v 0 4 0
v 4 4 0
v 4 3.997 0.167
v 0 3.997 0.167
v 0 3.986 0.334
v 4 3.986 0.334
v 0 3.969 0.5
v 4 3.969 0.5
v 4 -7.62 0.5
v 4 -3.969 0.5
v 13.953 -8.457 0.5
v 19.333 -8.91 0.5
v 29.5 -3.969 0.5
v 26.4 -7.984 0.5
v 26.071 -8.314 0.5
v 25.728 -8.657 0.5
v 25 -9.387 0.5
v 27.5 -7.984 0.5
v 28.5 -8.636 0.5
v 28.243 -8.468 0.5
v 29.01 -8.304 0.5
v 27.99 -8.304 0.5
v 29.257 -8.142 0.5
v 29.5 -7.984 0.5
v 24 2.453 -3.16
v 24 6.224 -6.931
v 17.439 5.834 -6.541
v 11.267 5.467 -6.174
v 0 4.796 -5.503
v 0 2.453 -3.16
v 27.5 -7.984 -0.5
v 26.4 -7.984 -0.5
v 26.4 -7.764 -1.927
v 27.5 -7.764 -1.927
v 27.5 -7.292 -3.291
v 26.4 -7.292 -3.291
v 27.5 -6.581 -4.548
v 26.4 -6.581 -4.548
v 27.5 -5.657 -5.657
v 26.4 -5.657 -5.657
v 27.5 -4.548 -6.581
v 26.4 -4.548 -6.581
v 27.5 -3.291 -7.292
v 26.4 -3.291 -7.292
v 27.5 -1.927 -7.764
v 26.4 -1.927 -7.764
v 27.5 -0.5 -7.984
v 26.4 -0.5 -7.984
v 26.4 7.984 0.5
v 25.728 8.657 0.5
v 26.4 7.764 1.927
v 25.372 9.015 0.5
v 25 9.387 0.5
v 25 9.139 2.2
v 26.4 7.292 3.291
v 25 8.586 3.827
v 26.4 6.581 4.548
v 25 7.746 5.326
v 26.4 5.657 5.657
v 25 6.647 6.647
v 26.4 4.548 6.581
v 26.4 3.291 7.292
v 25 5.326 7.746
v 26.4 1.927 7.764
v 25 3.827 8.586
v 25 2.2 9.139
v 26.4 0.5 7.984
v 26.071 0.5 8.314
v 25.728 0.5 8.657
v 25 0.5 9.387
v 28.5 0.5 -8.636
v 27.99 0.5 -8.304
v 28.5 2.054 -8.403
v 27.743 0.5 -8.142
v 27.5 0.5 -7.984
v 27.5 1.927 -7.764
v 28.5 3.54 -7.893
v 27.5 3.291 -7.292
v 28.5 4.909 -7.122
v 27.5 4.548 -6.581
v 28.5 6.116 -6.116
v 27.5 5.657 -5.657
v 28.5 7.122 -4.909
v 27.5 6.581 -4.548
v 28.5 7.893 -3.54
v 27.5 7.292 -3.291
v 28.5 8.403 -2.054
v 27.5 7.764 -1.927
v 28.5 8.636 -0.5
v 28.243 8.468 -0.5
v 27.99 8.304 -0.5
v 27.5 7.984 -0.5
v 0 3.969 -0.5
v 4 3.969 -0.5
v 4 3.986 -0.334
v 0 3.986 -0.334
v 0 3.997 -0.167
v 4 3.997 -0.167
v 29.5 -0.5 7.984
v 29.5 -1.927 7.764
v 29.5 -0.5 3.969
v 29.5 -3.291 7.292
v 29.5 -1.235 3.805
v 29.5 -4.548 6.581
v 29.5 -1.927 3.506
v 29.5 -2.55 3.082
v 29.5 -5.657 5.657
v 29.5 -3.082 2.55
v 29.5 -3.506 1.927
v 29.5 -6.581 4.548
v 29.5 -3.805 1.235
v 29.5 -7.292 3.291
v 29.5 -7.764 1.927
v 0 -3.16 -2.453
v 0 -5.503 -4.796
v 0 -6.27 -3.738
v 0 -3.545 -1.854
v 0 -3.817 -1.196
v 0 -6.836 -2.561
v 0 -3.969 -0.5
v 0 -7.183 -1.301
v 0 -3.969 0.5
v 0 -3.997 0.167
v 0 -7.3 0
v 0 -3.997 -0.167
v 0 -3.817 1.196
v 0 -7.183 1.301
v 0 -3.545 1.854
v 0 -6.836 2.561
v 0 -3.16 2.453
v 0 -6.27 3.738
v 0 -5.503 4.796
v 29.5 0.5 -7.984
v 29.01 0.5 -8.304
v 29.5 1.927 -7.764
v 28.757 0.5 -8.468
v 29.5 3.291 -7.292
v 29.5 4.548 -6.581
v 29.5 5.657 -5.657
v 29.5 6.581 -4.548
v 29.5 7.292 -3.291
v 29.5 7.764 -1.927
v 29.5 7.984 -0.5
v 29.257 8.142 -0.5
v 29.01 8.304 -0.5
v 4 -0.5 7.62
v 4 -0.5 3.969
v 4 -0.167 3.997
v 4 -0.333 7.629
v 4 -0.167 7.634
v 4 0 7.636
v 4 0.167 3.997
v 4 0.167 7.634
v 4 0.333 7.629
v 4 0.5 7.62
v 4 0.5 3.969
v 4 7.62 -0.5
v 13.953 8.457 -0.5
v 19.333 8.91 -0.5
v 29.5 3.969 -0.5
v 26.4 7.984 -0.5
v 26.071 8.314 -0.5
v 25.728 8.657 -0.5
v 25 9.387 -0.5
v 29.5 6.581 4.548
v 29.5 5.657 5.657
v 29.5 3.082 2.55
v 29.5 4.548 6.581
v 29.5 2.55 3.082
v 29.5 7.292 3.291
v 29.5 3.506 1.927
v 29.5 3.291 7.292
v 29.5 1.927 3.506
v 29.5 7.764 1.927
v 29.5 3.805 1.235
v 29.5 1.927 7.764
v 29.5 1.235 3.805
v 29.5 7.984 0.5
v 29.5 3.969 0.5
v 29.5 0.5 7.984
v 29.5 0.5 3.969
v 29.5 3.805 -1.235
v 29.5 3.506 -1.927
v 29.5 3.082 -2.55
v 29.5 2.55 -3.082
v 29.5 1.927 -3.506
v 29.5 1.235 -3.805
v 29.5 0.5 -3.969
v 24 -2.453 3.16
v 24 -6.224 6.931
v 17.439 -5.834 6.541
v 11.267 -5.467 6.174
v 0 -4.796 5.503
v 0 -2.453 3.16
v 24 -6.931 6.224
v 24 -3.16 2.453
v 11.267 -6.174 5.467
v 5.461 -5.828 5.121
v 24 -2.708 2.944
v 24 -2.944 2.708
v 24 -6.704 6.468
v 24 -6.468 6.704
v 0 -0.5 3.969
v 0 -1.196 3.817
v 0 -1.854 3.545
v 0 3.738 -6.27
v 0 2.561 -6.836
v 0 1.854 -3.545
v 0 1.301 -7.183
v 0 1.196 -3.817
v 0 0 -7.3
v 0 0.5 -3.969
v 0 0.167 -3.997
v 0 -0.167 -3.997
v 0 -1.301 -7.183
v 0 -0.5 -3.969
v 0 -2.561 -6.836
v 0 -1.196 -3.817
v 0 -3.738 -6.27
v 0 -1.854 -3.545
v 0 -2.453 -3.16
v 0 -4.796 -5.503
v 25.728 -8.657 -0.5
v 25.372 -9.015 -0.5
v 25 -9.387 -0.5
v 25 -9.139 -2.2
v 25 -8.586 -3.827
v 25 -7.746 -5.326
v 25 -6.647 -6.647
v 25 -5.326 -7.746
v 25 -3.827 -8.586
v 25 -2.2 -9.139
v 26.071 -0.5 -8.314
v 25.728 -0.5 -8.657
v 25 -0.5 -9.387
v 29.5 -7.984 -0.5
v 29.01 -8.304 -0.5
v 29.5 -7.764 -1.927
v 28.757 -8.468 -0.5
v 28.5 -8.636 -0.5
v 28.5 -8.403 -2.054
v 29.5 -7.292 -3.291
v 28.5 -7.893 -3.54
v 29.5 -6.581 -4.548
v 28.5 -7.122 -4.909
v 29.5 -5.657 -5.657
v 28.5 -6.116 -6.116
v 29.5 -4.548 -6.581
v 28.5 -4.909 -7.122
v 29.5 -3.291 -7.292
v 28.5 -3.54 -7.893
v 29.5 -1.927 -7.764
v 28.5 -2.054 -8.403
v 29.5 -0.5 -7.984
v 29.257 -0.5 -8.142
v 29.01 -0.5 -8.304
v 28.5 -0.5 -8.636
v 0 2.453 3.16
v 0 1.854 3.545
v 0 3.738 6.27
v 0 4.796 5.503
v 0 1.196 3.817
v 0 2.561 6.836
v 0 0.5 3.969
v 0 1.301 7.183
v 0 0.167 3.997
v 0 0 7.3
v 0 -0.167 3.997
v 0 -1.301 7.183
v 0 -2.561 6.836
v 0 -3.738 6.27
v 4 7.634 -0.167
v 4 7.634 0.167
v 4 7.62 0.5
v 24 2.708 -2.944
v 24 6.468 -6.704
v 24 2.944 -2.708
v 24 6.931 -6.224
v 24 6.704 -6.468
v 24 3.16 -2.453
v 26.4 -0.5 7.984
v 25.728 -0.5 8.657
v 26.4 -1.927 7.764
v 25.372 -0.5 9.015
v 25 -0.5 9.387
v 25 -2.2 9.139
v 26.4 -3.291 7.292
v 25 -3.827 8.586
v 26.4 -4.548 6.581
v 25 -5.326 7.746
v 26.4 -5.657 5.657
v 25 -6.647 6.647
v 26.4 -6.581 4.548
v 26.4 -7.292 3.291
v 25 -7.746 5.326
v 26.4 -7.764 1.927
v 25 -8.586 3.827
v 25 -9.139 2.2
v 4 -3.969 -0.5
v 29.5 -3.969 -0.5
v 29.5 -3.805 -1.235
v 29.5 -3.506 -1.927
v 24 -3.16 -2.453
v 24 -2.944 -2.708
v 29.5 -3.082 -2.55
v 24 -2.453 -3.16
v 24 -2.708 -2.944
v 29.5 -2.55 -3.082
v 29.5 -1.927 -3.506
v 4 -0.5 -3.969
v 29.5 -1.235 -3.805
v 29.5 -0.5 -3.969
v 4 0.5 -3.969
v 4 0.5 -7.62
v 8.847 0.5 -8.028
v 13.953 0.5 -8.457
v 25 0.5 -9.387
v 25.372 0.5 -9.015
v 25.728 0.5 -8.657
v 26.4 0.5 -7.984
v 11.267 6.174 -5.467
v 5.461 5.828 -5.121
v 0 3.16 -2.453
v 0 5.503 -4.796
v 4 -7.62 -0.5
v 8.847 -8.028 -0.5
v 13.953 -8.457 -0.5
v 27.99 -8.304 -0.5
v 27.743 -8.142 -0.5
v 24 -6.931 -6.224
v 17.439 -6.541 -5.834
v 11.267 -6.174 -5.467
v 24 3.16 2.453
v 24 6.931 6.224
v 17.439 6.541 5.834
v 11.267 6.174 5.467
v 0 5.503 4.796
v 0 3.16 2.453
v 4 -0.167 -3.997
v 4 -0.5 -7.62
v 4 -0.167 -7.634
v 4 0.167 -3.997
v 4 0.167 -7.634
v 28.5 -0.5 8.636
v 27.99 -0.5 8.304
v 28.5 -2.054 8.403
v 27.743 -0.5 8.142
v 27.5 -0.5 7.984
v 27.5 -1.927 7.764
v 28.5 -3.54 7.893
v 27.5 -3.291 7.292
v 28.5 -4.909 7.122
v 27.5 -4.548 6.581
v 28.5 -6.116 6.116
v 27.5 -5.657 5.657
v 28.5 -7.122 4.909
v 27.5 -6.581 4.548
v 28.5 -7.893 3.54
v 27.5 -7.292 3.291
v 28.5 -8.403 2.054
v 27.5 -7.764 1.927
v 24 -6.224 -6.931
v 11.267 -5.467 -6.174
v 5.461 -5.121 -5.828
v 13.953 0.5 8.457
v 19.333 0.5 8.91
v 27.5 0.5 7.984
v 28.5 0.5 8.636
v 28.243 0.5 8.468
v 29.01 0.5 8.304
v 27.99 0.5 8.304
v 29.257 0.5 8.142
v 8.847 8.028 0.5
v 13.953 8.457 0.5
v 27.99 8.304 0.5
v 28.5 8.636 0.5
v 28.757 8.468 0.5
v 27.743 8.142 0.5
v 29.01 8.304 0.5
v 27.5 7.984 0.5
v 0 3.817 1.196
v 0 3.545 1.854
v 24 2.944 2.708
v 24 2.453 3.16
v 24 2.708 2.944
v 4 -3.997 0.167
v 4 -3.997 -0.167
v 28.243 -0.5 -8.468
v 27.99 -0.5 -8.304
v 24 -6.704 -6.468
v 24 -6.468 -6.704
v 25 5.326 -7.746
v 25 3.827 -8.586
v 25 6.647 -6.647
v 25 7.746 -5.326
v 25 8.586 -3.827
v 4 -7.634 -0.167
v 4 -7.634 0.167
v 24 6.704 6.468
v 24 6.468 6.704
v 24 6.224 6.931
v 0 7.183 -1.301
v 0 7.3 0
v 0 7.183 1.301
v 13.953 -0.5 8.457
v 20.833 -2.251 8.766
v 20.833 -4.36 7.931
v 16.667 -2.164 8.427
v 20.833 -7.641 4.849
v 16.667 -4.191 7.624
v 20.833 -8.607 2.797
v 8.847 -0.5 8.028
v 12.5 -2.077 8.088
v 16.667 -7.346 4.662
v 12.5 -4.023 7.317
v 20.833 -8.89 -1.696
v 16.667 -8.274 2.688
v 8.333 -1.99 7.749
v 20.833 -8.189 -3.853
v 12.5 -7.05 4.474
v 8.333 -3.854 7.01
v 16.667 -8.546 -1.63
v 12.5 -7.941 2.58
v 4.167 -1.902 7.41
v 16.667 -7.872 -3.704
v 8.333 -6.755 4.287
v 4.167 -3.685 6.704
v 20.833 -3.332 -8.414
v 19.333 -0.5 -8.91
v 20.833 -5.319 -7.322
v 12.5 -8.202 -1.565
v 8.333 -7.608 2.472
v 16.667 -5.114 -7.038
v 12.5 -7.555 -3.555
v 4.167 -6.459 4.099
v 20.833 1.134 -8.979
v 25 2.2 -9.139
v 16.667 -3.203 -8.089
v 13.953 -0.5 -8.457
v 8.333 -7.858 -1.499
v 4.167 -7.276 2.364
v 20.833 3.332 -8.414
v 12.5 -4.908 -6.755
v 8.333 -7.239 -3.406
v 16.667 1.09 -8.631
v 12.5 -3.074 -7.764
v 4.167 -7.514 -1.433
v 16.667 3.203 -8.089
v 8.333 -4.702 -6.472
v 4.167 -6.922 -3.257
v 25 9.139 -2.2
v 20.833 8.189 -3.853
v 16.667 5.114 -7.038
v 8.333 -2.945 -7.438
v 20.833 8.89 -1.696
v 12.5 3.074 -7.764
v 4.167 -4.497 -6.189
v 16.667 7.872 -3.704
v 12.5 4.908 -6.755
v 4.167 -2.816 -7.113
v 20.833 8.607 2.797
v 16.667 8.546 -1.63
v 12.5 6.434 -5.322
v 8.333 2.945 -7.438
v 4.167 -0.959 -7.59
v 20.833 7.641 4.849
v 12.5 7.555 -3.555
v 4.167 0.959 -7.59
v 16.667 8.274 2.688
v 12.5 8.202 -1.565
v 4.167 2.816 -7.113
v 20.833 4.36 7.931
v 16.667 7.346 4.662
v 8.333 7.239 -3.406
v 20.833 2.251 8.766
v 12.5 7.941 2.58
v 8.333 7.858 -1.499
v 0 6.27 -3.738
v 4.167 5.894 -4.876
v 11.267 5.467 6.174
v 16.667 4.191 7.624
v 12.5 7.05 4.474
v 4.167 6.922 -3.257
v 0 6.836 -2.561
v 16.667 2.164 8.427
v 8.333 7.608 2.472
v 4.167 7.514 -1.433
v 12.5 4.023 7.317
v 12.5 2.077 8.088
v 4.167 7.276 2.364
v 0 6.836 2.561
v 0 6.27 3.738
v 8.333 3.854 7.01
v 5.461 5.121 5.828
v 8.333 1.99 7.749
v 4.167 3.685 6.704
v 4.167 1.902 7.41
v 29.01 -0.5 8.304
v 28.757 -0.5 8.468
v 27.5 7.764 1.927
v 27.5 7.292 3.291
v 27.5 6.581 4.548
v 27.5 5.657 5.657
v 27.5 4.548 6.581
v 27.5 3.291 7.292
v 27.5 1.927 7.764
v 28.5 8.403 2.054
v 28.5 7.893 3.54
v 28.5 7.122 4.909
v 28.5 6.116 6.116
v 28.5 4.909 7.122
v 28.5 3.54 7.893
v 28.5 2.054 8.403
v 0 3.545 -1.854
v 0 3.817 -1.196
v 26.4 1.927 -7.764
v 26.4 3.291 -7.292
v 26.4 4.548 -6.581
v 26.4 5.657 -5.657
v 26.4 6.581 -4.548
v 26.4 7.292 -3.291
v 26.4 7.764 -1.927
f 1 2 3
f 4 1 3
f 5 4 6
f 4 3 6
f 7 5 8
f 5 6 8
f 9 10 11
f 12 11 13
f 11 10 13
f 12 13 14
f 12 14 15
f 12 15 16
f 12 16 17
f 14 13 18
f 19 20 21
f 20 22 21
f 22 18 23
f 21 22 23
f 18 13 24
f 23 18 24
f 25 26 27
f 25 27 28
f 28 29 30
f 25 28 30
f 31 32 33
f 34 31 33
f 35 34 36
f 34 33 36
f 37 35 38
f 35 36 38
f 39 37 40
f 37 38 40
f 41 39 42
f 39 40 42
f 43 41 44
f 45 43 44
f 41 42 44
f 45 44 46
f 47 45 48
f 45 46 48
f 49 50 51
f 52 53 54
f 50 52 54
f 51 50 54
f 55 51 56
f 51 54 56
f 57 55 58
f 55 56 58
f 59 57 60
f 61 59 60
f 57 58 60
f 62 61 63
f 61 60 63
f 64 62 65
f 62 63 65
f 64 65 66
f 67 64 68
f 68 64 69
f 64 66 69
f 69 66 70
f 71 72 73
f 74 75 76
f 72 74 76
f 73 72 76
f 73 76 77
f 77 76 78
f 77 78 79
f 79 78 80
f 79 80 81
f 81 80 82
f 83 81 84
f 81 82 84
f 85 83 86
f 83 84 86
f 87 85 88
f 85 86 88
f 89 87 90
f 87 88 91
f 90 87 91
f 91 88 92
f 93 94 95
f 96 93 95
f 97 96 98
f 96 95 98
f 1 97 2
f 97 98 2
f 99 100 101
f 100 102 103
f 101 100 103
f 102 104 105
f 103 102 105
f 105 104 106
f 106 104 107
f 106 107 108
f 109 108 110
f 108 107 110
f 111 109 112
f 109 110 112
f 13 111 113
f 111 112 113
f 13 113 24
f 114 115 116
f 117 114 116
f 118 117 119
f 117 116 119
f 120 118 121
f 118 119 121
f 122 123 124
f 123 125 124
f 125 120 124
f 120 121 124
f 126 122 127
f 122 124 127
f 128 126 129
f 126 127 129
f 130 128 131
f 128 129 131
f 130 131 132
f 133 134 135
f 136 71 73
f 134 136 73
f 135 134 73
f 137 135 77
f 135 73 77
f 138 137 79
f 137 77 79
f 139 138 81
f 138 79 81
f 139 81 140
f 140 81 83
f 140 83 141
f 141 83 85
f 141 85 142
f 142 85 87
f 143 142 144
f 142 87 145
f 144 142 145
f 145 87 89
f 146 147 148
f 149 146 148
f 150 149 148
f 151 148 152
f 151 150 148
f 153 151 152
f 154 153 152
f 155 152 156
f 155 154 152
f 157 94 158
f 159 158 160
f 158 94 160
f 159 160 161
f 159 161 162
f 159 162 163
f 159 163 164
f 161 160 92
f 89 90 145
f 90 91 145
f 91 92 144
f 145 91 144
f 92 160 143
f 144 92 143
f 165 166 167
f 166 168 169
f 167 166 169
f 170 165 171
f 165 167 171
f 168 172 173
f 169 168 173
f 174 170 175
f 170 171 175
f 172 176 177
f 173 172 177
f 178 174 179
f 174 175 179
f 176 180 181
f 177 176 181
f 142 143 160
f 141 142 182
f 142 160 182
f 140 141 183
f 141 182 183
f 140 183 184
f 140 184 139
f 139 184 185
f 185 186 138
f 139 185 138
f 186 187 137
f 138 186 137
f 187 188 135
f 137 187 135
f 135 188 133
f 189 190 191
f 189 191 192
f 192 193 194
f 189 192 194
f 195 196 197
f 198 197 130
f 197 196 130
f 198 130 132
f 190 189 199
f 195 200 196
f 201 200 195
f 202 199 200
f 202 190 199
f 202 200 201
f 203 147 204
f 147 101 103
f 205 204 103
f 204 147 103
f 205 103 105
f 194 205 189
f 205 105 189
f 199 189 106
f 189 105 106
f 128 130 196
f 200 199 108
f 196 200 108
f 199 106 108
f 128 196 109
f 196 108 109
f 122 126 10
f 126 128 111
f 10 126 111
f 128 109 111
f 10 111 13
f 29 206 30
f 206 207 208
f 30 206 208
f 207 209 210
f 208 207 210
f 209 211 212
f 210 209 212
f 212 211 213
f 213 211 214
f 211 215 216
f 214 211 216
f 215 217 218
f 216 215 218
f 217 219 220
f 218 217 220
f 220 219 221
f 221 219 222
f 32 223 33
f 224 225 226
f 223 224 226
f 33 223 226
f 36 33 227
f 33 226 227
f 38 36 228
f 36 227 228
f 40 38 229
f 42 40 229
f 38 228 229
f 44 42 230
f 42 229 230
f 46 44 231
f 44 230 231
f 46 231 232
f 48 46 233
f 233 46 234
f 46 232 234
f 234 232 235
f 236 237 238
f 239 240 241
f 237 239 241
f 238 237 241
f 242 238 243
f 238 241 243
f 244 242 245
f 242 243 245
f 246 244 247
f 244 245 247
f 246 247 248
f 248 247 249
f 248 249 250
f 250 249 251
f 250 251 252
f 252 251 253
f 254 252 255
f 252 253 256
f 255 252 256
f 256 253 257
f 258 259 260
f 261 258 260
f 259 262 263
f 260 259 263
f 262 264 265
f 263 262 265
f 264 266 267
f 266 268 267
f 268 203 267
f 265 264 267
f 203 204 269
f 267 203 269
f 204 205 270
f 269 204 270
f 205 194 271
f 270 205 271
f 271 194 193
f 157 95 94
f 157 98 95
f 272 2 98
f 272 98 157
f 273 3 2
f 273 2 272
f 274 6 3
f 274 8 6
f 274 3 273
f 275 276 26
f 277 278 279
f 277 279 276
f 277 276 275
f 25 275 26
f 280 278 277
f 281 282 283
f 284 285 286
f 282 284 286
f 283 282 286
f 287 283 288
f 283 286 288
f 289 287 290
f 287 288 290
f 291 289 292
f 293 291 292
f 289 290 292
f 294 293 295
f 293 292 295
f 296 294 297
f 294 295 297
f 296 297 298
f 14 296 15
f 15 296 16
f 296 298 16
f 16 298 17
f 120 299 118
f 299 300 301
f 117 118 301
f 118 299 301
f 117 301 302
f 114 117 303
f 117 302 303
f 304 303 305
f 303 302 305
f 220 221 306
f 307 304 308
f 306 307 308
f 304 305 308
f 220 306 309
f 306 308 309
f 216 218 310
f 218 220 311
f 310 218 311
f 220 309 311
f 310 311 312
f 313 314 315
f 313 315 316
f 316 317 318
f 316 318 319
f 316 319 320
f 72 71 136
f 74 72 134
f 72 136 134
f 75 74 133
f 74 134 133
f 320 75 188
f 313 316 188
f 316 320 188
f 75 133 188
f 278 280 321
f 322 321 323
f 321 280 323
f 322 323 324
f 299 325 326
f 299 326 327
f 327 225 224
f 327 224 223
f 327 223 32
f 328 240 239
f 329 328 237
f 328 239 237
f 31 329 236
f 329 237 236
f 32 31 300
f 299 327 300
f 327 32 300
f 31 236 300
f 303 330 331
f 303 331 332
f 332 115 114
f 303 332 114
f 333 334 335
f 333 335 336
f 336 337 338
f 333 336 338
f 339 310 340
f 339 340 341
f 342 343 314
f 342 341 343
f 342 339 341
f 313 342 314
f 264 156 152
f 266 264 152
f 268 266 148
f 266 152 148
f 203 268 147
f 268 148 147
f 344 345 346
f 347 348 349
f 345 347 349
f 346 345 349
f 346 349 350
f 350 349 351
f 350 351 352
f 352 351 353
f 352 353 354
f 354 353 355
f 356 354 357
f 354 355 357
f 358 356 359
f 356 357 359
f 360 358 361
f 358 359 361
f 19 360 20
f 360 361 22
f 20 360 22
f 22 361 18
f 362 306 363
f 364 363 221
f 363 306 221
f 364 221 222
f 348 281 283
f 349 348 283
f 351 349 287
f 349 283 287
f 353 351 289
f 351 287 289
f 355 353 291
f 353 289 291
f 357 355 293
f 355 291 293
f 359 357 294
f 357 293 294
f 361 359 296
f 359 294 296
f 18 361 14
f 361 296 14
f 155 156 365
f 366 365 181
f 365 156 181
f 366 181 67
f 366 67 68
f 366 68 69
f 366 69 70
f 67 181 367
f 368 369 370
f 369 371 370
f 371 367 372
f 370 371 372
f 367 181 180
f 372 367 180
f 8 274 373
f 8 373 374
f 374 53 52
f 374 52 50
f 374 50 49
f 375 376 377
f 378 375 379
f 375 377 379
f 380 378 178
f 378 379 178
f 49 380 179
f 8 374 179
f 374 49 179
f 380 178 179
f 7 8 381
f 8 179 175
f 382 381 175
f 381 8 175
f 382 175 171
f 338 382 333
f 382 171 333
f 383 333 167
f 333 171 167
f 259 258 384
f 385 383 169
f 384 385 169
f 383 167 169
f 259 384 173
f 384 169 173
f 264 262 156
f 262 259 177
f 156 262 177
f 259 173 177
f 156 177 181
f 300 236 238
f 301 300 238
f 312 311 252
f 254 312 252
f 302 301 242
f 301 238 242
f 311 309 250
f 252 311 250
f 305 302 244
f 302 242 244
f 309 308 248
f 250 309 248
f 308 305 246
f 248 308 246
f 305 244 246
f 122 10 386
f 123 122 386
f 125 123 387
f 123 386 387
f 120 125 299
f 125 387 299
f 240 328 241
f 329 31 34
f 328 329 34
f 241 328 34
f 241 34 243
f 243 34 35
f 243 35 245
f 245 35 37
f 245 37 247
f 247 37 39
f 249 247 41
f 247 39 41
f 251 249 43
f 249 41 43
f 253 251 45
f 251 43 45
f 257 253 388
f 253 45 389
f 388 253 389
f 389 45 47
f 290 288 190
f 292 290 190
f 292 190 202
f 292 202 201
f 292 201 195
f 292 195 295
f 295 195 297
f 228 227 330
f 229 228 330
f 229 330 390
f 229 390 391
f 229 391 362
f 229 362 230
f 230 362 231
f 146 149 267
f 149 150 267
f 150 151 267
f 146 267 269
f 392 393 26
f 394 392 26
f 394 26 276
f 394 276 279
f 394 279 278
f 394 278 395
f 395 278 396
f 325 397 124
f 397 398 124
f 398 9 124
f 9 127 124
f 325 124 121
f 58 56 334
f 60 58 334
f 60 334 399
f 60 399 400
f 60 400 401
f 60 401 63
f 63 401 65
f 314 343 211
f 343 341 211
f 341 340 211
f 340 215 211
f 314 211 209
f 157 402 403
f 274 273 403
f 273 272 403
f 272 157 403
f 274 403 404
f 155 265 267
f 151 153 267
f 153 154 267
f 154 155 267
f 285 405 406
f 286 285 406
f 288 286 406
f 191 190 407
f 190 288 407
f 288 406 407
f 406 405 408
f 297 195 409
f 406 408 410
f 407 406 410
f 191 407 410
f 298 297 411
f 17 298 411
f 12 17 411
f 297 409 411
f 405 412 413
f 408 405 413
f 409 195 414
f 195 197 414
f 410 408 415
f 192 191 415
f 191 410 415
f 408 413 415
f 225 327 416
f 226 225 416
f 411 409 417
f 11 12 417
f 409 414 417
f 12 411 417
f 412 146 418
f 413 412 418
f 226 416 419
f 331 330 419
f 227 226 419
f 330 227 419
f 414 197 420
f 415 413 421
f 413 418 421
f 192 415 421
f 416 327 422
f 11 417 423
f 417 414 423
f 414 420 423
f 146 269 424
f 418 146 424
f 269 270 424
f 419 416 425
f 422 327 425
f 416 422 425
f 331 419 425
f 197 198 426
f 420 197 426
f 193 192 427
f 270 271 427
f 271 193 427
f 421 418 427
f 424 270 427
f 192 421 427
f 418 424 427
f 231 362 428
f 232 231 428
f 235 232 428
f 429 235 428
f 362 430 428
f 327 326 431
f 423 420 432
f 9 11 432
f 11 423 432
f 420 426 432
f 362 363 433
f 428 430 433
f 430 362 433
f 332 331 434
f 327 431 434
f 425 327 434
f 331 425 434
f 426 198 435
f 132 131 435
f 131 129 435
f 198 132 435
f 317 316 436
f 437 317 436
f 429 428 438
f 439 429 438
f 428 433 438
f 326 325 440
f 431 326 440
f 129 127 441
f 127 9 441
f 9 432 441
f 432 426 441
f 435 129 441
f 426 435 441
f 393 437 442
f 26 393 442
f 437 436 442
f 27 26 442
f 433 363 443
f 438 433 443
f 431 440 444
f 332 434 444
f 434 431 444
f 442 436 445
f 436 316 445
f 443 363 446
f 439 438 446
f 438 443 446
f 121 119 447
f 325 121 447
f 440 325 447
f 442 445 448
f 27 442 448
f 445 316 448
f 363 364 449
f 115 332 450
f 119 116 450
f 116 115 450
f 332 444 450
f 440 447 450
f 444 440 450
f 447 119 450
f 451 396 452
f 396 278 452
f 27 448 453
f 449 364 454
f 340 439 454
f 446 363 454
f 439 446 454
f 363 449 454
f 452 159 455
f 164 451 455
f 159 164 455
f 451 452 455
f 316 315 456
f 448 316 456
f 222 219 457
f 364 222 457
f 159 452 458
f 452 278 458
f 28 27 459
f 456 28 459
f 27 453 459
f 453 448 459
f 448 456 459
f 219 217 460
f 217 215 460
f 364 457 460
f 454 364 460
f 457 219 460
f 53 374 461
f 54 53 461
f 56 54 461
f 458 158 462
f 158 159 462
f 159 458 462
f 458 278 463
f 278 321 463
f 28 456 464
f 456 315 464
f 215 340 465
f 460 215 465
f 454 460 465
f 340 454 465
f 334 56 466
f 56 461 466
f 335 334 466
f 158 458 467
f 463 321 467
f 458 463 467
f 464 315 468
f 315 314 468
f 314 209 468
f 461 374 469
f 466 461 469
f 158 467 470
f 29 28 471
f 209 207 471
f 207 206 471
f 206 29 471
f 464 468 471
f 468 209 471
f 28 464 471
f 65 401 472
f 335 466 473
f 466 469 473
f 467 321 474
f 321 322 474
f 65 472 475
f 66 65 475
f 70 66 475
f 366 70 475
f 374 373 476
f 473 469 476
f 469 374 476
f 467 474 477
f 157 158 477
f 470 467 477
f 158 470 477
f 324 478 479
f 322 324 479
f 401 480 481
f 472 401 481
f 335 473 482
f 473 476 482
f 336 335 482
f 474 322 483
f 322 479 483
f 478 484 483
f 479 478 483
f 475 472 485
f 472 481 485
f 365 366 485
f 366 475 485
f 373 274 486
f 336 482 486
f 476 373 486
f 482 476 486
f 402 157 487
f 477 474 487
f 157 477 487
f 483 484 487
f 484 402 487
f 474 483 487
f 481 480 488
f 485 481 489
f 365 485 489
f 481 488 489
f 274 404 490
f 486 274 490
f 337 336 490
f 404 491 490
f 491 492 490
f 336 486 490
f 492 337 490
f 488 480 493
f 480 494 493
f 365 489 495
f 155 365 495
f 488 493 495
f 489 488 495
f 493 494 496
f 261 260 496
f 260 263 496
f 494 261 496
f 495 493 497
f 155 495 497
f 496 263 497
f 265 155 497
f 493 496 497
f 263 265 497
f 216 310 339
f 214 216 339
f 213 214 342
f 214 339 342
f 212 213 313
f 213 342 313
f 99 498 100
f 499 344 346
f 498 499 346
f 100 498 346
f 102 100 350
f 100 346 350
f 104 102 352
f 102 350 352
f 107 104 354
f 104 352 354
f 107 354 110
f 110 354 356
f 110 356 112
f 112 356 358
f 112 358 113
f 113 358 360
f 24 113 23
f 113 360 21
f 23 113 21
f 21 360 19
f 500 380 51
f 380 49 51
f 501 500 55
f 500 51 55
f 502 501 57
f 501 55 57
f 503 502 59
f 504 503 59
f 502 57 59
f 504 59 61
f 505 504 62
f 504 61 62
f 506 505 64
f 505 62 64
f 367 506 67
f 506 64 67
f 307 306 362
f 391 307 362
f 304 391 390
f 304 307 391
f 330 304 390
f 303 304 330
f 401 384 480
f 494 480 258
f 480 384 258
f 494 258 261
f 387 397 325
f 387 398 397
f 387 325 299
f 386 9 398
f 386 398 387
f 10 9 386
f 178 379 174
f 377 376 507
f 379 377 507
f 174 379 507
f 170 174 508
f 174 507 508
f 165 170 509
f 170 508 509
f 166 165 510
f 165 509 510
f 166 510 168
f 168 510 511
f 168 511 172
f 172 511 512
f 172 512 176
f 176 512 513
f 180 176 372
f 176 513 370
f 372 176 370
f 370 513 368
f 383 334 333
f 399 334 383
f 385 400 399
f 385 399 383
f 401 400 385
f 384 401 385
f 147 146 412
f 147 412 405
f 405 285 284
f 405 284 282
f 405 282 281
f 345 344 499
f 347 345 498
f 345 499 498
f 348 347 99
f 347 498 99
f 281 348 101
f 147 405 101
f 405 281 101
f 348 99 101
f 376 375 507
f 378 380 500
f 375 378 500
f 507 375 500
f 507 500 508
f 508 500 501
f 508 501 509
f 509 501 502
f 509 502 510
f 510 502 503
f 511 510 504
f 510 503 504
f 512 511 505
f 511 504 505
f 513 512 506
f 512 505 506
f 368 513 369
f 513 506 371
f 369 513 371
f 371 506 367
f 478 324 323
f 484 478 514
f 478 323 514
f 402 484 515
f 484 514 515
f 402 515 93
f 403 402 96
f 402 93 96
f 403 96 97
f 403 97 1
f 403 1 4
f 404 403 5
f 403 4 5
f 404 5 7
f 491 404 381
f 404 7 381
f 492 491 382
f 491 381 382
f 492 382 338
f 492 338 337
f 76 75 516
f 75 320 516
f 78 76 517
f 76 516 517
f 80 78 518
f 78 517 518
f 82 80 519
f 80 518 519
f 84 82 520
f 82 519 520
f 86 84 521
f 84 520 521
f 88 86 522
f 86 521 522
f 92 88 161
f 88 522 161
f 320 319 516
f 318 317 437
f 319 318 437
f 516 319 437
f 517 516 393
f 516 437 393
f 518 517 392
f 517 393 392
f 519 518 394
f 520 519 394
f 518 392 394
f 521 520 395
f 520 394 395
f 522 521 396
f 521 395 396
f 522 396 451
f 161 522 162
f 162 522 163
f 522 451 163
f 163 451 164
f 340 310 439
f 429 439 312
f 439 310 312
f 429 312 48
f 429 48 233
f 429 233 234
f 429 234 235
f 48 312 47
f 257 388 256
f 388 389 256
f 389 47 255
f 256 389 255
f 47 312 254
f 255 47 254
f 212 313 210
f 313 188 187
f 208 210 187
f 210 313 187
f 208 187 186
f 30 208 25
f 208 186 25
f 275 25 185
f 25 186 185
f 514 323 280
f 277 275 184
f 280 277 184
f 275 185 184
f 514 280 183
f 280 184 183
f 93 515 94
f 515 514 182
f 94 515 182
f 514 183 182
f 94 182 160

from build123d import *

# Parameters (mm, degrees)
F3_DEPTH = 29.501
F4_DEPTH = 25.5
F6_DEPTH = 24


with BuildPart() as f1:
    # F0 (on Front) → F1 (revolve)
    with BuildSketch(Plane.XZ):
        Polygon((0, 7.3), (0, 0), (29.5, 0), (29.5, 8), (28.5, 8.65), (27.5, 8), (26.4, 8), (25, 9.4), align=None)
    revolve(axis=Axis((14.75, 0, 0), (1, 0, 0)))

    # F2 (on face) → F3 (cut, through all)
    with BuildSketch(Plane.YZ.offset(29.5)):
        with BuildLine():
            Line((-0.5, 0.5), (-0.5, 3.9686269666))
            ThreePointArc((-0.5, 3.9686269666), (-2.8284271247, 2.8284271247), (-3.9686269666, 0.5))
            Line((-3.9686269666, 0.5), (-0.5, 0.5))
        make_face()
        with BuildLine():
            ThreePointArc((3.9686269666, -0.5), (3.9921490369, -0.2504916502), (4, 0))
            ThreePointArc((4, 0), (3.9921490369, 0.2504916502), (3.9686269666, 0.5))
            Line((3.9686269666, 0.5), (0.5, 0.5))
            Line((0.5, 0.5), (0.5, 3.9686269666))
            ThreePointArc((0.5, 3.9686269666), (0, 4), (-0.5, 3.9686269666))
            Line((-0.5, 3.9686269666), (-0.5, 0.5))
            Line((-0.5, 0.5), (-3.9686269666, 0.5))
            ThreePointArc((-3.9686269666, 0.5), (-4, 0), (-3.9686269666, -0.5))
            Line((-3.9686269666, -0.5), (-0.5, -0.5))
            Line((-0.5, -0.5), (-0.5, -3.9686269666))
            ThreePointArc((-0.5, -3.9686269666), (0, -4), (0.5, -3.9686269666))
            Line((0.5, -3.9686269666), (0.5, -0.5))
            Line((0.5, -0.5), (3.9686269666, -0.5))
        make_face()
        with BuildLine():
            Line((0.5, 0.5), (3.9686269666, 0.5))
            ThreePointArc((3.9686269666, 0.5), (2.8284271247, 2.8284271247), (0.5, 3.9686269666))
            Line((0.5, 3.9686269666), (0.5, 0.5))
        make_face()
        with BuildLine():
            ThreePointArc((0.5, -3.9686269666), (2.8284271247, -2.8284271247), (3.9686269666, -0.5))
            Line((3.9686269666, -0.5), (0.5, -0.5))
            Line((0.5, -0.5), (0.5, -3.9686269666))
        make_face()
        with BuildLine():
            ThreePointArc((-3.9686269666, -0.5), (-2.8284271247, -2.8284271247), (-0.5, -3.9686269666))
            Line((-0.5, -3.9686269666), (-0.5, -0.5))
            Line((-0.5, -0.5), (-3.9686269666, -0.5))
        make_face()
    extrude(amount=-F3_DEPTH, mode=Mode.SUBTRACT)

    # F2 (on face) → F4 (cut)
    with BuildSketch(Plane.YZ.offset(29.5)):
        with BuildLine():
            ThreePointArc((-0.5, 7.9843597113), (0, 8), (0.5, 7.9843597113))
            Line((0.5, 7.9843597113), (0.5, 10.0491633639))
            Line((0.5, 10.0491633639), (-0.5, 10.0491633639))
            Line((-0.5, 10.0491633639), (-0.5, 7.9843597113))
        make_face()
        with BuildLine():
            ThreePointArc((-0.5, 3.9686269666), (0, 4), (0.5, 3.9686269666))
            Line((0.5, 3.9686269666), (0.5, 7.9843597113))
            ThreePointArc((0.5, 7.9843597113), (0, 8), (-0.5, 7.9843597113))
            Line((-0.5, 7.9843597113), (-0.5, 3.9686269666))
        make_face()
        with BuildLine():
            ThreePointArc((3.9686269666, -0.5), (3.9921490369, -0.2504916502), (4, 0))
            ThreePointArc((4, 0), (3.9921490369, 0.2504916502), (3.9686269666, 0.5))
            Line((3.9686269666, 0.5), (0.5, 0.5))
            Line((0.5, 0.5), (0.5, 3.9686269666))
            ThreePointArc((0.5, 3.9686269666), (0, 4), (-0.5, 3.9686269666))
            Line((-0.5, 3.9686269666), (-0.5, 0.5))
            Line((-0.5, 0.5), (-3.9686269666, 0.5))
            ThreePointArc((-3.9686269666, 0.5), (-4, 0), (-3.9686269666, -0.5))
            Line((-3.9686269666, -0.5), (-0.5, -0.5))
            Line((-0.5, -0.5), (-0.5, -3.9686269666))
            ThreePointArc((-0.5, -3.9686269666), (0, -4), (0.5, -3.9686269666))
            Line((0.5, -3.9686269666), (0.5, -0.5))
            Line((0.5, -0.5), (3.9686269666, -0.5))
        make_face()
        with BuildLine():
            Line((0.5, -7.9843597113), (0.5, -3.9686269666))
            ThreePointArc((0.5, -3.9686269666), (0, -4), (-0.5, -3.9686269666))
            Line((-0.5, -3.9686269666), (-0.5, -7.9843597113))
            ThreePointArc((-0.5, -7.9843597113), (0, -8), (0.5, -7.9843597113))
        make_face()
        with BuildLine():
            Line((0.5, -10.0491633639), (0.5, -7.9843597113))
            ThreePointArc((0.5, -7.9843597113), (0, -8), (-0.5, -7.9843597113))
            Line((-0.5, -7.9843597113), (-0.5, -10.0491633639))
            Line((-0.5, -10.0491633639), (0.5, -10.0491633639))
        make_face()
        with BuildLine():
            ThreePointArc((-3.9686269666, -0.5), (-4, 0), (-3.9686269666, 0.5))
            Line((-3.9686269666, 0.5), (-7.9843597113, 0.5))
            ThreePointArc((-7.9843597113, 0.5), (-8, 0), (-7.9843597113, -0.5))
            Line((-7.9843597113, -0.5), (-3.9686269666, -0.5))
        make_face()
        with BuildLine():
            ThreePointArc((-7.9843597113, -0.5), (-8, 0), (-7.9843597113, 0.5))
            Line((-7.9843597113, 0.5), (-10.0491633639, 0.5))
            Line((-10.0491633639, 0.5), (-10.0491633639, -0.5))
            Line((-10.0491633639, -0.5), (-7.9843597113, -0.5))
        make_face()
        with BuildLine():
            ThreePointArc((3.9686269666, 0.5), (3.9921490369, 0.2504916502), (4, 0))
            ThreePointArc((4, 0), (3.9921490369, -0.2504916502), (3.9686269666, -0.5))
            Line((3.9686269666, -0.5), (7.9843597113, -0.5))
            ThreePointArc((7.9843597113, -0.5), (7.9960889718, -0.2501222794), (8, 0))
            ThreePointArc((8, 0), (7.9960889718, 0.2501222794), (7.9843597113, 0.5))
            Line((7.9843597113, 0.5), (3.9686269666, 0.5))
        make_face()
        with BuildLine():
            Line((10.0491633639, 0.5), (7.9843597113, 0.5))
            ThreePointArc((7.9843597113, 0.5), (7.9960889718, 0.2501222794), (8, 0))
            ThreePointArc((8, 0), (7.9960889718, -0.2501222794), (7.9843597113, -0.5))
            Line((7.9843597113, -0.5), (10.0491633639, -0.5))
            Line((10.0491633639, -0.5), (10.0491633639, 0.5))
        make_face()
    extrude(amount=-F4_DEPTH, mode=Mode.SUBTRACT)

    # F5 (on face) → F6 (cut)
    with BuildSketch(Plane(origin=(0, 0, 0), x_dir=(0, -1, 0), z_dir=(-1, 0, 0))):
        Polygon((6.7522781693, 7.4593849504), (0, 0.7071067812), (-6.7522781693, 7.4593849504), (-7.4593849504, 6.7522781693), (-0.7071067812, 0), (-7.4593849504, -6.7522781693), (-6.7522781693, -7.4593849504), (0, -0.7071067812), (6.7522781693, -7.4593849504), (7.4593849504, -6.7522781693), (0.7071067812, 0), (7.4593849504, 6.7522781693), align=None)
    extrude(amount=-F6_DEPTH, mode=Mode.SUBTRACT)


solid = f1.part
